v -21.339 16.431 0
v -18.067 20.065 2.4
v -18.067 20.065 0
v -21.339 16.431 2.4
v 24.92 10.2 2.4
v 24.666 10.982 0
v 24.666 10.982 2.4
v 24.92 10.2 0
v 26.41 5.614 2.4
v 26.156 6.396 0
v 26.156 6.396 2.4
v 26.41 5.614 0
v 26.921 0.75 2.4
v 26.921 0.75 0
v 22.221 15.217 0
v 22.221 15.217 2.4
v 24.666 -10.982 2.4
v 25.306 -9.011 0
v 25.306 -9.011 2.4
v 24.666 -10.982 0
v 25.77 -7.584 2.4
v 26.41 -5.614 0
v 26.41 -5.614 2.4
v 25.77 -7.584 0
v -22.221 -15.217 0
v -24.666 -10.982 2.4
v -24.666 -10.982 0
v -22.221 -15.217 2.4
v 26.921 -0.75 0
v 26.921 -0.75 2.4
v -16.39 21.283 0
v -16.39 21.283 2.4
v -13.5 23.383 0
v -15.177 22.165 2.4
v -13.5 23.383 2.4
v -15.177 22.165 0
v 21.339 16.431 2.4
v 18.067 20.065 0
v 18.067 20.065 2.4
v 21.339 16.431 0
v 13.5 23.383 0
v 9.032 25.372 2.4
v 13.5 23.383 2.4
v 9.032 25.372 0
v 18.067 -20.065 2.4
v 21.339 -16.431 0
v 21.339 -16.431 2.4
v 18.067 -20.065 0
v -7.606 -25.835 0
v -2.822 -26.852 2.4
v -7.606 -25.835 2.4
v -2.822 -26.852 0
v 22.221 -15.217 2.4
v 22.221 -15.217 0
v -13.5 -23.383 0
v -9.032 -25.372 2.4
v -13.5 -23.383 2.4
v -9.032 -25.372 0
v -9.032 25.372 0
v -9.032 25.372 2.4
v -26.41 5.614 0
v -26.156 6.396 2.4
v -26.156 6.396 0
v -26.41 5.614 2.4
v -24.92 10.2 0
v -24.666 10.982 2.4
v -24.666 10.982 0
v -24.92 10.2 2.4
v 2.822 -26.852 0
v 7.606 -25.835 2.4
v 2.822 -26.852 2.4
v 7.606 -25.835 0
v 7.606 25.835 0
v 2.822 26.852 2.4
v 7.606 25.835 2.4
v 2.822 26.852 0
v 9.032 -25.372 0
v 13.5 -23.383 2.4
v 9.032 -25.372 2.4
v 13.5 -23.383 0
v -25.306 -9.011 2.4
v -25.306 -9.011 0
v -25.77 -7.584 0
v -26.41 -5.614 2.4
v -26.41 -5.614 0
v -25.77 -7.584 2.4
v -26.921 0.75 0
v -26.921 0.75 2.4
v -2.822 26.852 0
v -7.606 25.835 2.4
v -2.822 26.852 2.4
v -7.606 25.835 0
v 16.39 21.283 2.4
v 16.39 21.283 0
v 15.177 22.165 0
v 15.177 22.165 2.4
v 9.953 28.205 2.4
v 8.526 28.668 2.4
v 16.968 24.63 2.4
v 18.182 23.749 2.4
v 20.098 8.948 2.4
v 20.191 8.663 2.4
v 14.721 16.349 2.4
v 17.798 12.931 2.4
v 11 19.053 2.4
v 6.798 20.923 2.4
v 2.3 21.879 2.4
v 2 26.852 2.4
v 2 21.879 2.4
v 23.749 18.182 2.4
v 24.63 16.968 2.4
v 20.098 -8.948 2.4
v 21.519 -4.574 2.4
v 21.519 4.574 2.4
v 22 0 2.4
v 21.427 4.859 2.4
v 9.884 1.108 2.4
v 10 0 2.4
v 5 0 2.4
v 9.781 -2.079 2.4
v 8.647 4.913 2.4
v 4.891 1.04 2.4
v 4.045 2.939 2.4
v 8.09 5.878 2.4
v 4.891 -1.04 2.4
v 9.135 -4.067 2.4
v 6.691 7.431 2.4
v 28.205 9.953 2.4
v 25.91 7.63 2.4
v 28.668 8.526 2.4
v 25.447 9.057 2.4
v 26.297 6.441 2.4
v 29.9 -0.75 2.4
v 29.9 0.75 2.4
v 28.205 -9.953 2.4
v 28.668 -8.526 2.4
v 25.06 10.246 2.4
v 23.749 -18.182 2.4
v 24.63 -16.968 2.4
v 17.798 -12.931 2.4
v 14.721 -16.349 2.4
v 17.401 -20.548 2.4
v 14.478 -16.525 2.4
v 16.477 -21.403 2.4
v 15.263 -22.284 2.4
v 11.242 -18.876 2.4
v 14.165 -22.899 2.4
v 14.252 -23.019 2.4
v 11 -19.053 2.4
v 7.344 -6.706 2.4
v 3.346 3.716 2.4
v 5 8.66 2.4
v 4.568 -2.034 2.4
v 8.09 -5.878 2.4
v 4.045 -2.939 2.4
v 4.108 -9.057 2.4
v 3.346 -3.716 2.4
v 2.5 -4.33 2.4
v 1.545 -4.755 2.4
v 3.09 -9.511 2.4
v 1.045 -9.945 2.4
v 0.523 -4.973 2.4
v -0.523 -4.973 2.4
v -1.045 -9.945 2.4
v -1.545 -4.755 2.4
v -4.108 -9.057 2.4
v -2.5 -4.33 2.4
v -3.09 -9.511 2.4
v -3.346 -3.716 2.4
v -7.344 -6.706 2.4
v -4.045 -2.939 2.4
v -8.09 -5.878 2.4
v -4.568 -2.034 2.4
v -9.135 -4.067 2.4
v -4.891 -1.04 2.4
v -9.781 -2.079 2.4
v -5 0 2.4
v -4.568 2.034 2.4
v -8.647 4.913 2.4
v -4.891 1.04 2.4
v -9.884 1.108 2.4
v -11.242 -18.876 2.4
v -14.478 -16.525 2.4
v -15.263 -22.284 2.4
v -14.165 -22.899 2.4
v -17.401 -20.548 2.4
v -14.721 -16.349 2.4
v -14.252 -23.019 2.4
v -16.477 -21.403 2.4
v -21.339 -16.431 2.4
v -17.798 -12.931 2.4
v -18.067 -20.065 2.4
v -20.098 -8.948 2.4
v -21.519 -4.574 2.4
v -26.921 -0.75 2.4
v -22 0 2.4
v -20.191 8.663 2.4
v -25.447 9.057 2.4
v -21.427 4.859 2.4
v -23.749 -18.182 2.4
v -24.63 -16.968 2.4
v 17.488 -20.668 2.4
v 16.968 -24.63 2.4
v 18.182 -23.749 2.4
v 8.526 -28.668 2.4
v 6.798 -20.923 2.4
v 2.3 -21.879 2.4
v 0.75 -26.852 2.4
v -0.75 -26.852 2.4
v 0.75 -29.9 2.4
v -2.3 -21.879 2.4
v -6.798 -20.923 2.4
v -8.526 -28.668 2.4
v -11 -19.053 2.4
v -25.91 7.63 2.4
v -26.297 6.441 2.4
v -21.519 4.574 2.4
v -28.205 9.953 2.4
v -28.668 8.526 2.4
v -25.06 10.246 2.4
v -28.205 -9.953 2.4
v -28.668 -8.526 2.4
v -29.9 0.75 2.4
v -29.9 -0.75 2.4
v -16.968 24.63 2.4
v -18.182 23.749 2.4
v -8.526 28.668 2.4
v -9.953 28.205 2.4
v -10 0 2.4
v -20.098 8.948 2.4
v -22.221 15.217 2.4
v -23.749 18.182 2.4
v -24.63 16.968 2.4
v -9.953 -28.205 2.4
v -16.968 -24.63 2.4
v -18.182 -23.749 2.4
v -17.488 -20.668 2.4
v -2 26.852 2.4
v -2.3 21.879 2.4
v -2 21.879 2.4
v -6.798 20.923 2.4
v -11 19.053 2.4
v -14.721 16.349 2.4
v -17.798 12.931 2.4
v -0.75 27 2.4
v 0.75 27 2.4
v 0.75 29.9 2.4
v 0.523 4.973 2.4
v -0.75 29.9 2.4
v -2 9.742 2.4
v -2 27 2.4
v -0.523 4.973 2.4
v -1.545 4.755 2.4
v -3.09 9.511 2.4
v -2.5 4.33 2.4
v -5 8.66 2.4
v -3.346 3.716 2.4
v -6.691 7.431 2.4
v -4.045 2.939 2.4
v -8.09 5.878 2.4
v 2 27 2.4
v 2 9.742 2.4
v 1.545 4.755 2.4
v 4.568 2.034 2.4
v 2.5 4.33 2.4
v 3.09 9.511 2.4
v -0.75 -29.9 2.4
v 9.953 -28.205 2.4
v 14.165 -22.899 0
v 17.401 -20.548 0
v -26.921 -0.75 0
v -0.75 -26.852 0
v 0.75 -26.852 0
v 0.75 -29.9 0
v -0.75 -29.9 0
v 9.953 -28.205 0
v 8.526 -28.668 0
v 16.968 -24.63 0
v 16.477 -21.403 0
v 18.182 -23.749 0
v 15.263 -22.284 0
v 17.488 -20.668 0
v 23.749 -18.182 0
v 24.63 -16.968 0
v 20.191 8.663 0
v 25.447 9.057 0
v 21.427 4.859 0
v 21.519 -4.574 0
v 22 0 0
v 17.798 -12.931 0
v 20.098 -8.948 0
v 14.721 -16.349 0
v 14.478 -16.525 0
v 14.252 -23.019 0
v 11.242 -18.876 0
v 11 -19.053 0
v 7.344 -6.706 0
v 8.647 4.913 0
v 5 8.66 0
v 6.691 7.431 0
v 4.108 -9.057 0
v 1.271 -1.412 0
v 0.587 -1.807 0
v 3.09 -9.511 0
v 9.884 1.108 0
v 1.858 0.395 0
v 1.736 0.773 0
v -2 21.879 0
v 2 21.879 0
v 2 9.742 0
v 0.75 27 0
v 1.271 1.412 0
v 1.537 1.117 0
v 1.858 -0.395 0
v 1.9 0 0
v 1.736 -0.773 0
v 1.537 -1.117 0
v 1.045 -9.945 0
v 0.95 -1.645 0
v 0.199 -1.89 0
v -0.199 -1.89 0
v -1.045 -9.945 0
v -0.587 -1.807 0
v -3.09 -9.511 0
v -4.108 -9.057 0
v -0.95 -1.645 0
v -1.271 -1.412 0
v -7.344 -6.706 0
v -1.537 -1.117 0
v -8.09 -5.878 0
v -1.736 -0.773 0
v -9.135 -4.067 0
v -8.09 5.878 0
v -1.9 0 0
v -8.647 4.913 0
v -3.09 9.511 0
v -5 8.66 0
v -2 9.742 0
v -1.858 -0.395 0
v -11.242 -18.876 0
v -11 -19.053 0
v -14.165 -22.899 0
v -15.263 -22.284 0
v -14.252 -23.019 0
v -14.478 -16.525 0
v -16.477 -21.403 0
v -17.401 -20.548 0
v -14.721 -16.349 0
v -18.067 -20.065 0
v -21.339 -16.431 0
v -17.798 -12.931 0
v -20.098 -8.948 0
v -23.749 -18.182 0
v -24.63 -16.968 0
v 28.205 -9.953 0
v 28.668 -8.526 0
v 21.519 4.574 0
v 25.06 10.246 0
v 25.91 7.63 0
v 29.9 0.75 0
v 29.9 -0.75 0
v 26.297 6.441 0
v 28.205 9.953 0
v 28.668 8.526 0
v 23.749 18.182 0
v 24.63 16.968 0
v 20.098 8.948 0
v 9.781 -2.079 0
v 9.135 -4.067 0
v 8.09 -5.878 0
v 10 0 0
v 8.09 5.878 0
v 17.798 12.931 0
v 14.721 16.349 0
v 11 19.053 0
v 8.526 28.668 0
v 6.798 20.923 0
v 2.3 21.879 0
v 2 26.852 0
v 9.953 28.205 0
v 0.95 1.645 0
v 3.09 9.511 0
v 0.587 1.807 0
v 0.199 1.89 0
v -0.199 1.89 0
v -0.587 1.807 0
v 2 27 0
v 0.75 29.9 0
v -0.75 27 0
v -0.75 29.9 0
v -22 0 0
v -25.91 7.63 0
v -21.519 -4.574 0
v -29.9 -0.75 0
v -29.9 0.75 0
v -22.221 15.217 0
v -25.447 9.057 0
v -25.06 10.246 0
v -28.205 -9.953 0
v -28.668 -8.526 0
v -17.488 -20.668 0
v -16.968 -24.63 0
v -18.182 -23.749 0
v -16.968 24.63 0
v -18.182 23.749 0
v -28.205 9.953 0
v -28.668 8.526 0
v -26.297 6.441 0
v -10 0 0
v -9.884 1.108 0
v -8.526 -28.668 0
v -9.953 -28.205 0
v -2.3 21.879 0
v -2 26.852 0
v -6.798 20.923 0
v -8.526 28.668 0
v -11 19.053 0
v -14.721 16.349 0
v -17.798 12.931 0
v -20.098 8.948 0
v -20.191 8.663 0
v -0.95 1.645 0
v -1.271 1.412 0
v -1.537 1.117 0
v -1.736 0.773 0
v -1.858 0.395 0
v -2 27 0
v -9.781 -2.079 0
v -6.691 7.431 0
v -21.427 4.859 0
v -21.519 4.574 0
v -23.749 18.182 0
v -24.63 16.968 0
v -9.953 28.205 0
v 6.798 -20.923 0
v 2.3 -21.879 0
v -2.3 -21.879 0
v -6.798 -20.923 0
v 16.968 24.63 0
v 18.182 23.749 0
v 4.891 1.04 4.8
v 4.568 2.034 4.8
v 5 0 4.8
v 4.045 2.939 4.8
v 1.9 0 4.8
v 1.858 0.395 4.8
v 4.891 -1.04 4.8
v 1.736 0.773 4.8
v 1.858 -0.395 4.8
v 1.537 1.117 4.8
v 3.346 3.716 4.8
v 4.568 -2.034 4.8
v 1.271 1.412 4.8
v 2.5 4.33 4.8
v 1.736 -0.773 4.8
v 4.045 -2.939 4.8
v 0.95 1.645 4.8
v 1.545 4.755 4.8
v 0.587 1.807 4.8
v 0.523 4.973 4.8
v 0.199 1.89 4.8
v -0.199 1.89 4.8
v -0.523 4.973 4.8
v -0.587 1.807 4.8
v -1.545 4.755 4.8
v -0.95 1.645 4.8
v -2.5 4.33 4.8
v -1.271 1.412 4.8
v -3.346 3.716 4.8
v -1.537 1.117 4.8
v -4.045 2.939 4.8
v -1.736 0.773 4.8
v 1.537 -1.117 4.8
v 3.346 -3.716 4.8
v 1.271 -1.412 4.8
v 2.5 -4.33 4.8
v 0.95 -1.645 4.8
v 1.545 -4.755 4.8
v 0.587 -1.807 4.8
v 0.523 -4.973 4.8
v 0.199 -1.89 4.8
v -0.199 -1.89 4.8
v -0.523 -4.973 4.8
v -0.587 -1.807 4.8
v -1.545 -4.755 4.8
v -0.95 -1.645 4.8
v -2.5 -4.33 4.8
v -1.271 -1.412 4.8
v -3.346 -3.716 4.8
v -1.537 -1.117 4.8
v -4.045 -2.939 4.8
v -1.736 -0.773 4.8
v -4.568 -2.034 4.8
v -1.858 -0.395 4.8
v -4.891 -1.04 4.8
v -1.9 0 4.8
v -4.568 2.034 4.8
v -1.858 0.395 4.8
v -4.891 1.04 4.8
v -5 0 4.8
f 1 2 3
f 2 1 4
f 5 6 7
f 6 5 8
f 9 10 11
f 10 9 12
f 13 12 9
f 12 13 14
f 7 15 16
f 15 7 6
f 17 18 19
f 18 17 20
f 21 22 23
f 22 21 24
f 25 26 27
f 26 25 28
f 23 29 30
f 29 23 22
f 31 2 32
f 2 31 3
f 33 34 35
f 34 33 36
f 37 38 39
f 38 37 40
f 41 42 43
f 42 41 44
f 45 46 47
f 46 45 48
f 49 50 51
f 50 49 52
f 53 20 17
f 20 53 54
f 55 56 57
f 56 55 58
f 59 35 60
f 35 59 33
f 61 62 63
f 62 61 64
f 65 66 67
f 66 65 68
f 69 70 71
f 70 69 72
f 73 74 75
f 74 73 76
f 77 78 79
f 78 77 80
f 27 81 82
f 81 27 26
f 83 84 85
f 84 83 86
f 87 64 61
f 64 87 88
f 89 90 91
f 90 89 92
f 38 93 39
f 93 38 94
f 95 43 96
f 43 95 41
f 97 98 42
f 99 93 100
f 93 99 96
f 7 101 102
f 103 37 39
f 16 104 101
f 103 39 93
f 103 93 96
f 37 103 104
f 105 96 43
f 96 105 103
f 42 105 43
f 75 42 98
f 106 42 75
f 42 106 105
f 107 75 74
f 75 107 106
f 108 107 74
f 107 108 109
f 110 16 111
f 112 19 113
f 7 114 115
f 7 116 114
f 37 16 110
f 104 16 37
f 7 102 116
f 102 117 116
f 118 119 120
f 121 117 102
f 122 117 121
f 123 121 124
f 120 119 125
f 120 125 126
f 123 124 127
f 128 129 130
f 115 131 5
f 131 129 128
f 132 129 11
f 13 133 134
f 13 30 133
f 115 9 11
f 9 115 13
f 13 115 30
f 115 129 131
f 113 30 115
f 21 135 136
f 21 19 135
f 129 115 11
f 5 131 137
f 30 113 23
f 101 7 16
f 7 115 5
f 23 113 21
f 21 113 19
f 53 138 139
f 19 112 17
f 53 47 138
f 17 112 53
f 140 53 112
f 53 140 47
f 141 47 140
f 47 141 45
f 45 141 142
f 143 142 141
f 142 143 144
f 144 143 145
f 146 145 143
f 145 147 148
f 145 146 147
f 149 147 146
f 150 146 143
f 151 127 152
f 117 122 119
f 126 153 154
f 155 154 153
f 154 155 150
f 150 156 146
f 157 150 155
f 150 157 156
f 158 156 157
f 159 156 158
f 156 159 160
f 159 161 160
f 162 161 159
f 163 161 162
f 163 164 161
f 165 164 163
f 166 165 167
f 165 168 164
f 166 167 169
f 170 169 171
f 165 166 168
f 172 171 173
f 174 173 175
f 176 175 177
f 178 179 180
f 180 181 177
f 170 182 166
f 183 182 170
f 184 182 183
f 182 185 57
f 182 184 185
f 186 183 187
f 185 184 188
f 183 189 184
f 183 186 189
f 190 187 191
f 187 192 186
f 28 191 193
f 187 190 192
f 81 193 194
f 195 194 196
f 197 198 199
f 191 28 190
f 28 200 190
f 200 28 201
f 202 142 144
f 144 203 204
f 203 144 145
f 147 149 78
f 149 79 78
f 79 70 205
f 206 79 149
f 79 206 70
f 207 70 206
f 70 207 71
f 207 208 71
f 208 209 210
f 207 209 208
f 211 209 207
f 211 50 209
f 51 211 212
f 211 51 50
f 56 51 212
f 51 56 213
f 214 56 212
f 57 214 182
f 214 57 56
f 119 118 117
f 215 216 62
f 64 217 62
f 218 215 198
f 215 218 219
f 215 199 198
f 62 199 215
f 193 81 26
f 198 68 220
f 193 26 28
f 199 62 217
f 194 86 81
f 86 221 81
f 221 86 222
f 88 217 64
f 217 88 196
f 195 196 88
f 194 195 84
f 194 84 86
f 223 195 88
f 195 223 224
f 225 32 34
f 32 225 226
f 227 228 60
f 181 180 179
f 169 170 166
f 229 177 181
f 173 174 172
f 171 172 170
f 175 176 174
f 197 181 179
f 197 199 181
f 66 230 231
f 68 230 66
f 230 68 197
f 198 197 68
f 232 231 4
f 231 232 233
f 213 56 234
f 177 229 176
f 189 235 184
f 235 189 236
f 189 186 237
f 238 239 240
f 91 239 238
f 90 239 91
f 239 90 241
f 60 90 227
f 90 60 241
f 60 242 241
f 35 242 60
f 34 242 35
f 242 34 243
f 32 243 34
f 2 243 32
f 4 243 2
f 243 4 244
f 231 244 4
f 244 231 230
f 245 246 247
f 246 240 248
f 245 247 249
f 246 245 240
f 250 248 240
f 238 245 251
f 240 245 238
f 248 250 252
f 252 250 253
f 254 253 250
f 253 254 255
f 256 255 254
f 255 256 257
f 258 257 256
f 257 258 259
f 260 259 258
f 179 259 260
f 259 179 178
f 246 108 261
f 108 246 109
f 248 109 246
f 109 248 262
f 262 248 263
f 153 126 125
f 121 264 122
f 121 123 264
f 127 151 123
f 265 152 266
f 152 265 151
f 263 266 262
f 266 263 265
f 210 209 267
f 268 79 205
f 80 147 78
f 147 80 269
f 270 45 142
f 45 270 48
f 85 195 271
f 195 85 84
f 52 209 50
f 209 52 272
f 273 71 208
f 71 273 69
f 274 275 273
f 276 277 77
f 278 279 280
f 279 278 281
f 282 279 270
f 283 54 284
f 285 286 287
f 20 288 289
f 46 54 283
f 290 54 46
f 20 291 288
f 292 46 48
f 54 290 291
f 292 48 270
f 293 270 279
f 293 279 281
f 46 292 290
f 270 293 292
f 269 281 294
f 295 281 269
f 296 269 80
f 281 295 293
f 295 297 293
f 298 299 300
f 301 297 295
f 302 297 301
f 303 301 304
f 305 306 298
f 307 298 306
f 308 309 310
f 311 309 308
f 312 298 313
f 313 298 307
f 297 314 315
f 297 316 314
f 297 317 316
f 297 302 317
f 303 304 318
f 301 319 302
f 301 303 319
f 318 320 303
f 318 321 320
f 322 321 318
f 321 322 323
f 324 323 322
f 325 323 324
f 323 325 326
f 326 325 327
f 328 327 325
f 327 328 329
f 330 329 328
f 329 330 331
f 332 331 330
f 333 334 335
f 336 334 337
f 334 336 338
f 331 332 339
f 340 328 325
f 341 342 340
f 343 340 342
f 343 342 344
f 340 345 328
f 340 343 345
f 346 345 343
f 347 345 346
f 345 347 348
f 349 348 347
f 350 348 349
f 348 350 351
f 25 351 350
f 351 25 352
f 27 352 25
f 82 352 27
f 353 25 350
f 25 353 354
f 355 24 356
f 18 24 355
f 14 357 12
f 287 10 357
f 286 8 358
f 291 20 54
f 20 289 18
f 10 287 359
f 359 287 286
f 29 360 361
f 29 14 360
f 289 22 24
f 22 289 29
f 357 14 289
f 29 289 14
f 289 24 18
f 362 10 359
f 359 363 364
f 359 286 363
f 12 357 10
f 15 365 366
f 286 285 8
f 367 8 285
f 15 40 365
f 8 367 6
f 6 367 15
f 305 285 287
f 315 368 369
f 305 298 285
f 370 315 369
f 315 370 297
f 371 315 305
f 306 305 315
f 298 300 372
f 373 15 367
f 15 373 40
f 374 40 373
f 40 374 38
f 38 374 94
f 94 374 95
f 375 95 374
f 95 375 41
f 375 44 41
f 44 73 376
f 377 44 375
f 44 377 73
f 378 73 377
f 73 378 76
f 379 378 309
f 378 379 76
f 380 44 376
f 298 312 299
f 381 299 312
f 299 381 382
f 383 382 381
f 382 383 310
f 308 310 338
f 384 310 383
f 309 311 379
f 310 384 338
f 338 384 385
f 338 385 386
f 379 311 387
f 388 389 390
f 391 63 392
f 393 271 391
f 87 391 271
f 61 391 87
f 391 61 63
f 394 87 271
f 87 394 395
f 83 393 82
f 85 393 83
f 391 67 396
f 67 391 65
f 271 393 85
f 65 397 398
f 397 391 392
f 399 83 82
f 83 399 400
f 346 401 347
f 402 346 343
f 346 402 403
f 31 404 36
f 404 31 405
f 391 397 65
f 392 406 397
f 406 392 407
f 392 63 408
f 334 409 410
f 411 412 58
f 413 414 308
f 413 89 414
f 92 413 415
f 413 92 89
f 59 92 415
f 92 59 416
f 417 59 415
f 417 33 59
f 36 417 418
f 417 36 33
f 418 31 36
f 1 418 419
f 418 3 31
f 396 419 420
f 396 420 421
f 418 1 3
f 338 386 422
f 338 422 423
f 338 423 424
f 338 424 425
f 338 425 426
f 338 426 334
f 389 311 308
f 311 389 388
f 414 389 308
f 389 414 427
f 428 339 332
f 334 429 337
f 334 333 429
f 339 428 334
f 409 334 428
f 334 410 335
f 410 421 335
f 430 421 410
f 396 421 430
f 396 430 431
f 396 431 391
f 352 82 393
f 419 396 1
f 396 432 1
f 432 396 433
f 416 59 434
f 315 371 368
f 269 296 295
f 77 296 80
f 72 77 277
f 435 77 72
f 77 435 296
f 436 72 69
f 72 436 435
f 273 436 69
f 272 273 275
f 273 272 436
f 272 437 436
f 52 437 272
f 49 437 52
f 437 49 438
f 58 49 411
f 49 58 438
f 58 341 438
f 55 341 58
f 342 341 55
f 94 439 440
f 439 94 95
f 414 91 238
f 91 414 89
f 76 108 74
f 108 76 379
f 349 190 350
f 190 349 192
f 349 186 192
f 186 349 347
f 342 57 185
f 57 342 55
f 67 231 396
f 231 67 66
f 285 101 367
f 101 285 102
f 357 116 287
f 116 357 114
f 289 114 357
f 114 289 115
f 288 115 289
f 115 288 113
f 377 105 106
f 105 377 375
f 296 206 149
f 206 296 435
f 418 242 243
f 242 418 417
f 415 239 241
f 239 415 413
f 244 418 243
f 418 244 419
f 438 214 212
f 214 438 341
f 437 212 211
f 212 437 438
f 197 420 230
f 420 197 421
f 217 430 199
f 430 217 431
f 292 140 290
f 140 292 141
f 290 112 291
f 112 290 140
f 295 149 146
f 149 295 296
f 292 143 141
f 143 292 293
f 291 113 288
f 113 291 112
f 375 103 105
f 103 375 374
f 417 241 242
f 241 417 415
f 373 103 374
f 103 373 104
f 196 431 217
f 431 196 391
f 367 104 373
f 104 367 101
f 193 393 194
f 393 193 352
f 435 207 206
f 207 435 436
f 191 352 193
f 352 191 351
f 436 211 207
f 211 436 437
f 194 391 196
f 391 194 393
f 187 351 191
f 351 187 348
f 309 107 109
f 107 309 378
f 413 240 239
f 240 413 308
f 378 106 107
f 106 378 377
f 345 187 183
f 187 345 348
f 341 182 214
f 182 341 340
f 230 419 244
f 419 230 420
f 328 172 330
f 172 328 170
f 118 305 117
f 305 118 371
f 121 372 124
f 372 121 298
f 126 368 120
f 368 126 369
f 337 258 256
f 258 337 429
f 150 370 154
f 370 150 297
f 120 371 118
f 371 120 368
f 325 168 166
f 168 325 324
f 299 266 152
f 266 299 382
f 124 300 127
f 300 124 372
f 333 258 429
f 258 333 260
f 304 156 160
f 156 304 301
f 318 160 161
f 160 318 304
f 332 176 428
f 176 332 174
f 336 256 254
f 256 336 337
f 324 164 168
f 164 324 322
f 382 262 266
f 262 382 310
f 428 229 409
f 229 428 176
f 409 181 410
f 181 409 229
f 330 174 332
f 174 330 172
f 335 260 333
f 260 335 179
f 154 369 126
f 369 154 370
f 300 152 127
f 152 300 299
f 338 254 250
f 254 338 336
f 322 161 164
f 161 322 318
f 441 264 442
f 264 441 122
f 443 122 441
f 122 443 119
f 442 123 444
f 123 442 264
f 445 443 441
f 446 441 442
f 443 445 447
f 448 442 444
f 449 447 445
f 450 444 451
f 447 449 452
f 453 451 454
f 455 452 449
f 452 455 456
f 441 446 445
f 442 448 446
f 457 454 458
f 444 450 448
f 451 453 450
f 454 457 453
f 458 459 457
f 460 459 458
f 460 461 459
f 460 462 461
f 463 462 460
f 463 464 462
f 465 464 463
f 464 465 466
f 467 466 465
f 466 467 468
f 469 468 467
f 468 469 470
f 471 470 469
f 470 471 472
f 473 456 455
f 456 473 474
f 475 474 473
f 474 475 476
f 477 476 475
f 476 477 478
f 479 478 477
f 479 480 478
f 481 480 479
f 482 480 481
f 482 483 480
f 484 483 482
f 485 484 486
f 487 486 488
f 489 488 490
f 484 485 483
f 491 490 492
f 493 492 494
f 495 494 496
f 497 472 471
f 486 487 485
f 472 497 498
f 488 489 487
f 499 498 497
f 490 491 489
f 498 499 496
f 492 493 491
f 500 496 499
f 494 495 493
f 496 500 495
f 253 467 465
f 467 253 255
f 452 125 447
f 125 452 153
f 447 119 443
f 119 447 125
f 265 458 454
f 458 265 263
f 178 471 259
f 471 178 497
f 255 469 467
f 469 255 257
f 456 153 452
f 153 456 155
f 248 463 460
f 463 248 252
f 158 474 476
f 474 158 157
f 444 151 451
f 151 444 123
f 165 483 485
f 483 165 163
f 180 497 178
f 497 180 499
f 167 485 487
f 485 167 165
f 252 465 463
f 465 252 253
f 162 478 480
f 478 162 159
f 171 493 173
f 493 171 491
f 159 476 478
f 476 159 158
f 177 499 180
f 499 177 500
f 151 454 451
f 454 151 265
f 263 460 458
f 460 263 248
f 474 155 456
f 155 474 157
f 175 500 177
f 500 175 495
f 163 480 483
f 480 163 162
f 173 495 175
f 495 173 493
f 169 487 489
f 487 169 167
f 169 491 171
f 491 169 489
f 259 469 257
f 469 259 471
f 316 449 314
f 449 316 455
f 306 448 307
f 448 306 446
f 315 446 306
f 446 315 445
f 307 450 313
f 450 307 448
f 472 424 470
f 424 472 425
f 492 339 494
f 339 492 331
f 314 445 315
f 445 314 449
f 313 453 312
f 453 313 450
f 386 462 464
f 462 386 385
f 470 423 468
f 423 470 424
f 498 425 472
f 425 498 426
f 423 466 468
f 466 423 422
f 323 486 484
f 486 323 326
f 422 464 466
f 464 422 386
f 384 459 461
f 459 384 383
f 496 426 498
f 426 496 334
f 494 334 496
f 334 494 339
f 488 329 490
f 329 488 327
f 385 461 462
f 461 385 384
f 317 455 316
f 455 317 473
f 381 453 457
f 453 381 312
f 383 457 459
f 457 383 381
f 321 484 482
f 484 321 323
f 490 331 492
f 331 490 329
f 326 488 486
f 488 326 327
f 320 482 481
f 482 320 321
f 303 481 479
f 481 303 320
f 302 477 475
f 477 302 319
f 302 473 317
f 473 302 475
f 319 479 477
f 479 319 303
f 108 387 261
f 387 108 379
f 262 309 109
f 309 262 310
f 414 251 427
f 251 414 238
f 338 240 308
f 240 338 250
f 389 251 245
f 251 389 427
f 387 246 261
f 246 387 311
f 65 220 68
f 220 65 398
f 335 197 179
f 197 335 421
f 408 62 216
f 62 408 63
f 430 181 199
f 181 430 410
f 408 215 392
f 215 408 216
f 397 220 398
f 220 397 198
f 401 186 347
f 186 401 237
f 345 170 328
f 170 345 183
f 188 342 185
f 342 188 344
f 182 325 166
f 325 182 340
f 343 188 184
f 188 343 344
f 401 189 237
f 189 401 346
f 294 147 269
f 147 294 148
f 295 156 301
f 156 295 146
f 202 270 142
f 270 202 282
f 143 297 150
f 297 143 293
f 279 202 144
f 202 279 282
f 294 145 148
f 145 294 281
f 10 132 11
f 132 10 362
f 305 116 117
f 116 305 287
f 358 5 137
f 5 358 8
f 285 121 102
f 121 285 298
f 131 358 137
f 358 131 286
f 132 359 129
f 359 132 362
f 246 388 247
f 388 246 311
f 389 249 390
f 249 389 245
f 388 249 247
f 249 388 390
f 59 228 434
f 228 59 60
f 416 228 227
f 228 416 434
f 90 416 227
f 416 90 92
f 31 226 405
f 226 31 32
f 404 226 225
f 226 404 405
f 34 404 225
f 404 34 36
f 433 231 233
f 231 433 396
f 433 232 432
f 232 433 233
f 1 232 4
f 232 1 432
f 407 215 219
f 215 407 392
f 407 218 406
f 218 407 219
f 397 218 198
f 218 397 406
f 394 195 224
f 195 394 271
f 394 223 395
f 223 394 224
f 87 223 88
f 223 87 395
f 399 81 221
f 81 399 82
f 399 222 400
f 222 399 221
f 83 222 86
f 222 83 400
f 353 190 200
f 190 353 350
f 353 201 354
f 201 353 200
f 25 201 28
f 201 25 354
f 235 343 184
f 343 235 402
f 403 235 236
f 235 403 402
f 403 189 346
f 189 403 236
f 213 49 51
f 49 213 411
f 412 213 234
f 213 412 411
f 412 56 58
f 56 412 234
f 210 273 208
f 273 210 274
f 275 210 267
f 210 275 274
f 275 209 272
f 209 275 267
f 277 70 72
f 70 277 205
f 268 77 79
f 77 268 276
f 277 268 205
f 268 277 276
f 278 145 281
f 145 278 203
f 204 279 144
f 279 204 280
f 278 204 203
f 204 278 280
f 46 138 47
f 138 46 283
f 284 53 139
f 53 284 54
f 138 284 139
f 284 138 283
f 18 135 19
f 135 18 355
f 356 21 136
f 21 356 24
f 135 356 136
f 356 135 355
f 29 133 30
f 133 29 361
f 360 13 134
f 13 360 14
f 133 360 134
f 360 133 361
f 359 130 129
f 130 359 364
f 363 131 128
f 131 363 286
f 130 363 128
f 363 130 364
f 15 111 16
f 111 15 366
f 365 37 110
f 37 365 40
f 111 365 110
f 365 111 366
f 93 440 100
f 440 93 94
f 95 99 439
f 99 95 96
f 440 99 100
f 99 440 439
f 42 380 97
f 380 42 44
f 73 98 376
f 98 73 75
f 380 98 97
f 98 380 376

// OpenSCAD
module paddle(angle)
{
  rotate([0,0,angle])
    translate(v=[-0.75,26.8,0])
      cube(size=[1.5,3.1,2.4]);
}

module strut(angle)
{
  rotate([0,0,angle])
    translate(v=[-2,3,0])
      cube(size=[4,24,2.4]);
}

difference()
{
  cylinder(h=2.4,r=27,$fs=0.1);

  cylinder(h=2.4,r=22,$fs=0.1);
}

difference()
{
  union()
  {
    cylinder(h=2.4,r=10,$fs=0.1);
    cylinder(h=4.8,r=5,$fs=0.1);
  }

  cylinder(h=4.8,r=1.9,$fs=0.1);
}

strut(0);
strut(1*72);
strut(2*72);
strut(3*72);
strut(4*72);


paddle(0);
paddle(1*18);
paddle(2*18);
paddle(3*18);
paddle(4*18);
paddle(5*18);
paddle(6*18);
paddle(7*18);
paddle(8*18);
paddle(9*18);
paddle(10*18);
paddle(11*18);
paddle(12*18);
paddle(13*18);
paddle(14*18);
paddle(15*18);
paddle(16*18);
paddle(17*18);
paddle(18*18);
paddle(19*18);
